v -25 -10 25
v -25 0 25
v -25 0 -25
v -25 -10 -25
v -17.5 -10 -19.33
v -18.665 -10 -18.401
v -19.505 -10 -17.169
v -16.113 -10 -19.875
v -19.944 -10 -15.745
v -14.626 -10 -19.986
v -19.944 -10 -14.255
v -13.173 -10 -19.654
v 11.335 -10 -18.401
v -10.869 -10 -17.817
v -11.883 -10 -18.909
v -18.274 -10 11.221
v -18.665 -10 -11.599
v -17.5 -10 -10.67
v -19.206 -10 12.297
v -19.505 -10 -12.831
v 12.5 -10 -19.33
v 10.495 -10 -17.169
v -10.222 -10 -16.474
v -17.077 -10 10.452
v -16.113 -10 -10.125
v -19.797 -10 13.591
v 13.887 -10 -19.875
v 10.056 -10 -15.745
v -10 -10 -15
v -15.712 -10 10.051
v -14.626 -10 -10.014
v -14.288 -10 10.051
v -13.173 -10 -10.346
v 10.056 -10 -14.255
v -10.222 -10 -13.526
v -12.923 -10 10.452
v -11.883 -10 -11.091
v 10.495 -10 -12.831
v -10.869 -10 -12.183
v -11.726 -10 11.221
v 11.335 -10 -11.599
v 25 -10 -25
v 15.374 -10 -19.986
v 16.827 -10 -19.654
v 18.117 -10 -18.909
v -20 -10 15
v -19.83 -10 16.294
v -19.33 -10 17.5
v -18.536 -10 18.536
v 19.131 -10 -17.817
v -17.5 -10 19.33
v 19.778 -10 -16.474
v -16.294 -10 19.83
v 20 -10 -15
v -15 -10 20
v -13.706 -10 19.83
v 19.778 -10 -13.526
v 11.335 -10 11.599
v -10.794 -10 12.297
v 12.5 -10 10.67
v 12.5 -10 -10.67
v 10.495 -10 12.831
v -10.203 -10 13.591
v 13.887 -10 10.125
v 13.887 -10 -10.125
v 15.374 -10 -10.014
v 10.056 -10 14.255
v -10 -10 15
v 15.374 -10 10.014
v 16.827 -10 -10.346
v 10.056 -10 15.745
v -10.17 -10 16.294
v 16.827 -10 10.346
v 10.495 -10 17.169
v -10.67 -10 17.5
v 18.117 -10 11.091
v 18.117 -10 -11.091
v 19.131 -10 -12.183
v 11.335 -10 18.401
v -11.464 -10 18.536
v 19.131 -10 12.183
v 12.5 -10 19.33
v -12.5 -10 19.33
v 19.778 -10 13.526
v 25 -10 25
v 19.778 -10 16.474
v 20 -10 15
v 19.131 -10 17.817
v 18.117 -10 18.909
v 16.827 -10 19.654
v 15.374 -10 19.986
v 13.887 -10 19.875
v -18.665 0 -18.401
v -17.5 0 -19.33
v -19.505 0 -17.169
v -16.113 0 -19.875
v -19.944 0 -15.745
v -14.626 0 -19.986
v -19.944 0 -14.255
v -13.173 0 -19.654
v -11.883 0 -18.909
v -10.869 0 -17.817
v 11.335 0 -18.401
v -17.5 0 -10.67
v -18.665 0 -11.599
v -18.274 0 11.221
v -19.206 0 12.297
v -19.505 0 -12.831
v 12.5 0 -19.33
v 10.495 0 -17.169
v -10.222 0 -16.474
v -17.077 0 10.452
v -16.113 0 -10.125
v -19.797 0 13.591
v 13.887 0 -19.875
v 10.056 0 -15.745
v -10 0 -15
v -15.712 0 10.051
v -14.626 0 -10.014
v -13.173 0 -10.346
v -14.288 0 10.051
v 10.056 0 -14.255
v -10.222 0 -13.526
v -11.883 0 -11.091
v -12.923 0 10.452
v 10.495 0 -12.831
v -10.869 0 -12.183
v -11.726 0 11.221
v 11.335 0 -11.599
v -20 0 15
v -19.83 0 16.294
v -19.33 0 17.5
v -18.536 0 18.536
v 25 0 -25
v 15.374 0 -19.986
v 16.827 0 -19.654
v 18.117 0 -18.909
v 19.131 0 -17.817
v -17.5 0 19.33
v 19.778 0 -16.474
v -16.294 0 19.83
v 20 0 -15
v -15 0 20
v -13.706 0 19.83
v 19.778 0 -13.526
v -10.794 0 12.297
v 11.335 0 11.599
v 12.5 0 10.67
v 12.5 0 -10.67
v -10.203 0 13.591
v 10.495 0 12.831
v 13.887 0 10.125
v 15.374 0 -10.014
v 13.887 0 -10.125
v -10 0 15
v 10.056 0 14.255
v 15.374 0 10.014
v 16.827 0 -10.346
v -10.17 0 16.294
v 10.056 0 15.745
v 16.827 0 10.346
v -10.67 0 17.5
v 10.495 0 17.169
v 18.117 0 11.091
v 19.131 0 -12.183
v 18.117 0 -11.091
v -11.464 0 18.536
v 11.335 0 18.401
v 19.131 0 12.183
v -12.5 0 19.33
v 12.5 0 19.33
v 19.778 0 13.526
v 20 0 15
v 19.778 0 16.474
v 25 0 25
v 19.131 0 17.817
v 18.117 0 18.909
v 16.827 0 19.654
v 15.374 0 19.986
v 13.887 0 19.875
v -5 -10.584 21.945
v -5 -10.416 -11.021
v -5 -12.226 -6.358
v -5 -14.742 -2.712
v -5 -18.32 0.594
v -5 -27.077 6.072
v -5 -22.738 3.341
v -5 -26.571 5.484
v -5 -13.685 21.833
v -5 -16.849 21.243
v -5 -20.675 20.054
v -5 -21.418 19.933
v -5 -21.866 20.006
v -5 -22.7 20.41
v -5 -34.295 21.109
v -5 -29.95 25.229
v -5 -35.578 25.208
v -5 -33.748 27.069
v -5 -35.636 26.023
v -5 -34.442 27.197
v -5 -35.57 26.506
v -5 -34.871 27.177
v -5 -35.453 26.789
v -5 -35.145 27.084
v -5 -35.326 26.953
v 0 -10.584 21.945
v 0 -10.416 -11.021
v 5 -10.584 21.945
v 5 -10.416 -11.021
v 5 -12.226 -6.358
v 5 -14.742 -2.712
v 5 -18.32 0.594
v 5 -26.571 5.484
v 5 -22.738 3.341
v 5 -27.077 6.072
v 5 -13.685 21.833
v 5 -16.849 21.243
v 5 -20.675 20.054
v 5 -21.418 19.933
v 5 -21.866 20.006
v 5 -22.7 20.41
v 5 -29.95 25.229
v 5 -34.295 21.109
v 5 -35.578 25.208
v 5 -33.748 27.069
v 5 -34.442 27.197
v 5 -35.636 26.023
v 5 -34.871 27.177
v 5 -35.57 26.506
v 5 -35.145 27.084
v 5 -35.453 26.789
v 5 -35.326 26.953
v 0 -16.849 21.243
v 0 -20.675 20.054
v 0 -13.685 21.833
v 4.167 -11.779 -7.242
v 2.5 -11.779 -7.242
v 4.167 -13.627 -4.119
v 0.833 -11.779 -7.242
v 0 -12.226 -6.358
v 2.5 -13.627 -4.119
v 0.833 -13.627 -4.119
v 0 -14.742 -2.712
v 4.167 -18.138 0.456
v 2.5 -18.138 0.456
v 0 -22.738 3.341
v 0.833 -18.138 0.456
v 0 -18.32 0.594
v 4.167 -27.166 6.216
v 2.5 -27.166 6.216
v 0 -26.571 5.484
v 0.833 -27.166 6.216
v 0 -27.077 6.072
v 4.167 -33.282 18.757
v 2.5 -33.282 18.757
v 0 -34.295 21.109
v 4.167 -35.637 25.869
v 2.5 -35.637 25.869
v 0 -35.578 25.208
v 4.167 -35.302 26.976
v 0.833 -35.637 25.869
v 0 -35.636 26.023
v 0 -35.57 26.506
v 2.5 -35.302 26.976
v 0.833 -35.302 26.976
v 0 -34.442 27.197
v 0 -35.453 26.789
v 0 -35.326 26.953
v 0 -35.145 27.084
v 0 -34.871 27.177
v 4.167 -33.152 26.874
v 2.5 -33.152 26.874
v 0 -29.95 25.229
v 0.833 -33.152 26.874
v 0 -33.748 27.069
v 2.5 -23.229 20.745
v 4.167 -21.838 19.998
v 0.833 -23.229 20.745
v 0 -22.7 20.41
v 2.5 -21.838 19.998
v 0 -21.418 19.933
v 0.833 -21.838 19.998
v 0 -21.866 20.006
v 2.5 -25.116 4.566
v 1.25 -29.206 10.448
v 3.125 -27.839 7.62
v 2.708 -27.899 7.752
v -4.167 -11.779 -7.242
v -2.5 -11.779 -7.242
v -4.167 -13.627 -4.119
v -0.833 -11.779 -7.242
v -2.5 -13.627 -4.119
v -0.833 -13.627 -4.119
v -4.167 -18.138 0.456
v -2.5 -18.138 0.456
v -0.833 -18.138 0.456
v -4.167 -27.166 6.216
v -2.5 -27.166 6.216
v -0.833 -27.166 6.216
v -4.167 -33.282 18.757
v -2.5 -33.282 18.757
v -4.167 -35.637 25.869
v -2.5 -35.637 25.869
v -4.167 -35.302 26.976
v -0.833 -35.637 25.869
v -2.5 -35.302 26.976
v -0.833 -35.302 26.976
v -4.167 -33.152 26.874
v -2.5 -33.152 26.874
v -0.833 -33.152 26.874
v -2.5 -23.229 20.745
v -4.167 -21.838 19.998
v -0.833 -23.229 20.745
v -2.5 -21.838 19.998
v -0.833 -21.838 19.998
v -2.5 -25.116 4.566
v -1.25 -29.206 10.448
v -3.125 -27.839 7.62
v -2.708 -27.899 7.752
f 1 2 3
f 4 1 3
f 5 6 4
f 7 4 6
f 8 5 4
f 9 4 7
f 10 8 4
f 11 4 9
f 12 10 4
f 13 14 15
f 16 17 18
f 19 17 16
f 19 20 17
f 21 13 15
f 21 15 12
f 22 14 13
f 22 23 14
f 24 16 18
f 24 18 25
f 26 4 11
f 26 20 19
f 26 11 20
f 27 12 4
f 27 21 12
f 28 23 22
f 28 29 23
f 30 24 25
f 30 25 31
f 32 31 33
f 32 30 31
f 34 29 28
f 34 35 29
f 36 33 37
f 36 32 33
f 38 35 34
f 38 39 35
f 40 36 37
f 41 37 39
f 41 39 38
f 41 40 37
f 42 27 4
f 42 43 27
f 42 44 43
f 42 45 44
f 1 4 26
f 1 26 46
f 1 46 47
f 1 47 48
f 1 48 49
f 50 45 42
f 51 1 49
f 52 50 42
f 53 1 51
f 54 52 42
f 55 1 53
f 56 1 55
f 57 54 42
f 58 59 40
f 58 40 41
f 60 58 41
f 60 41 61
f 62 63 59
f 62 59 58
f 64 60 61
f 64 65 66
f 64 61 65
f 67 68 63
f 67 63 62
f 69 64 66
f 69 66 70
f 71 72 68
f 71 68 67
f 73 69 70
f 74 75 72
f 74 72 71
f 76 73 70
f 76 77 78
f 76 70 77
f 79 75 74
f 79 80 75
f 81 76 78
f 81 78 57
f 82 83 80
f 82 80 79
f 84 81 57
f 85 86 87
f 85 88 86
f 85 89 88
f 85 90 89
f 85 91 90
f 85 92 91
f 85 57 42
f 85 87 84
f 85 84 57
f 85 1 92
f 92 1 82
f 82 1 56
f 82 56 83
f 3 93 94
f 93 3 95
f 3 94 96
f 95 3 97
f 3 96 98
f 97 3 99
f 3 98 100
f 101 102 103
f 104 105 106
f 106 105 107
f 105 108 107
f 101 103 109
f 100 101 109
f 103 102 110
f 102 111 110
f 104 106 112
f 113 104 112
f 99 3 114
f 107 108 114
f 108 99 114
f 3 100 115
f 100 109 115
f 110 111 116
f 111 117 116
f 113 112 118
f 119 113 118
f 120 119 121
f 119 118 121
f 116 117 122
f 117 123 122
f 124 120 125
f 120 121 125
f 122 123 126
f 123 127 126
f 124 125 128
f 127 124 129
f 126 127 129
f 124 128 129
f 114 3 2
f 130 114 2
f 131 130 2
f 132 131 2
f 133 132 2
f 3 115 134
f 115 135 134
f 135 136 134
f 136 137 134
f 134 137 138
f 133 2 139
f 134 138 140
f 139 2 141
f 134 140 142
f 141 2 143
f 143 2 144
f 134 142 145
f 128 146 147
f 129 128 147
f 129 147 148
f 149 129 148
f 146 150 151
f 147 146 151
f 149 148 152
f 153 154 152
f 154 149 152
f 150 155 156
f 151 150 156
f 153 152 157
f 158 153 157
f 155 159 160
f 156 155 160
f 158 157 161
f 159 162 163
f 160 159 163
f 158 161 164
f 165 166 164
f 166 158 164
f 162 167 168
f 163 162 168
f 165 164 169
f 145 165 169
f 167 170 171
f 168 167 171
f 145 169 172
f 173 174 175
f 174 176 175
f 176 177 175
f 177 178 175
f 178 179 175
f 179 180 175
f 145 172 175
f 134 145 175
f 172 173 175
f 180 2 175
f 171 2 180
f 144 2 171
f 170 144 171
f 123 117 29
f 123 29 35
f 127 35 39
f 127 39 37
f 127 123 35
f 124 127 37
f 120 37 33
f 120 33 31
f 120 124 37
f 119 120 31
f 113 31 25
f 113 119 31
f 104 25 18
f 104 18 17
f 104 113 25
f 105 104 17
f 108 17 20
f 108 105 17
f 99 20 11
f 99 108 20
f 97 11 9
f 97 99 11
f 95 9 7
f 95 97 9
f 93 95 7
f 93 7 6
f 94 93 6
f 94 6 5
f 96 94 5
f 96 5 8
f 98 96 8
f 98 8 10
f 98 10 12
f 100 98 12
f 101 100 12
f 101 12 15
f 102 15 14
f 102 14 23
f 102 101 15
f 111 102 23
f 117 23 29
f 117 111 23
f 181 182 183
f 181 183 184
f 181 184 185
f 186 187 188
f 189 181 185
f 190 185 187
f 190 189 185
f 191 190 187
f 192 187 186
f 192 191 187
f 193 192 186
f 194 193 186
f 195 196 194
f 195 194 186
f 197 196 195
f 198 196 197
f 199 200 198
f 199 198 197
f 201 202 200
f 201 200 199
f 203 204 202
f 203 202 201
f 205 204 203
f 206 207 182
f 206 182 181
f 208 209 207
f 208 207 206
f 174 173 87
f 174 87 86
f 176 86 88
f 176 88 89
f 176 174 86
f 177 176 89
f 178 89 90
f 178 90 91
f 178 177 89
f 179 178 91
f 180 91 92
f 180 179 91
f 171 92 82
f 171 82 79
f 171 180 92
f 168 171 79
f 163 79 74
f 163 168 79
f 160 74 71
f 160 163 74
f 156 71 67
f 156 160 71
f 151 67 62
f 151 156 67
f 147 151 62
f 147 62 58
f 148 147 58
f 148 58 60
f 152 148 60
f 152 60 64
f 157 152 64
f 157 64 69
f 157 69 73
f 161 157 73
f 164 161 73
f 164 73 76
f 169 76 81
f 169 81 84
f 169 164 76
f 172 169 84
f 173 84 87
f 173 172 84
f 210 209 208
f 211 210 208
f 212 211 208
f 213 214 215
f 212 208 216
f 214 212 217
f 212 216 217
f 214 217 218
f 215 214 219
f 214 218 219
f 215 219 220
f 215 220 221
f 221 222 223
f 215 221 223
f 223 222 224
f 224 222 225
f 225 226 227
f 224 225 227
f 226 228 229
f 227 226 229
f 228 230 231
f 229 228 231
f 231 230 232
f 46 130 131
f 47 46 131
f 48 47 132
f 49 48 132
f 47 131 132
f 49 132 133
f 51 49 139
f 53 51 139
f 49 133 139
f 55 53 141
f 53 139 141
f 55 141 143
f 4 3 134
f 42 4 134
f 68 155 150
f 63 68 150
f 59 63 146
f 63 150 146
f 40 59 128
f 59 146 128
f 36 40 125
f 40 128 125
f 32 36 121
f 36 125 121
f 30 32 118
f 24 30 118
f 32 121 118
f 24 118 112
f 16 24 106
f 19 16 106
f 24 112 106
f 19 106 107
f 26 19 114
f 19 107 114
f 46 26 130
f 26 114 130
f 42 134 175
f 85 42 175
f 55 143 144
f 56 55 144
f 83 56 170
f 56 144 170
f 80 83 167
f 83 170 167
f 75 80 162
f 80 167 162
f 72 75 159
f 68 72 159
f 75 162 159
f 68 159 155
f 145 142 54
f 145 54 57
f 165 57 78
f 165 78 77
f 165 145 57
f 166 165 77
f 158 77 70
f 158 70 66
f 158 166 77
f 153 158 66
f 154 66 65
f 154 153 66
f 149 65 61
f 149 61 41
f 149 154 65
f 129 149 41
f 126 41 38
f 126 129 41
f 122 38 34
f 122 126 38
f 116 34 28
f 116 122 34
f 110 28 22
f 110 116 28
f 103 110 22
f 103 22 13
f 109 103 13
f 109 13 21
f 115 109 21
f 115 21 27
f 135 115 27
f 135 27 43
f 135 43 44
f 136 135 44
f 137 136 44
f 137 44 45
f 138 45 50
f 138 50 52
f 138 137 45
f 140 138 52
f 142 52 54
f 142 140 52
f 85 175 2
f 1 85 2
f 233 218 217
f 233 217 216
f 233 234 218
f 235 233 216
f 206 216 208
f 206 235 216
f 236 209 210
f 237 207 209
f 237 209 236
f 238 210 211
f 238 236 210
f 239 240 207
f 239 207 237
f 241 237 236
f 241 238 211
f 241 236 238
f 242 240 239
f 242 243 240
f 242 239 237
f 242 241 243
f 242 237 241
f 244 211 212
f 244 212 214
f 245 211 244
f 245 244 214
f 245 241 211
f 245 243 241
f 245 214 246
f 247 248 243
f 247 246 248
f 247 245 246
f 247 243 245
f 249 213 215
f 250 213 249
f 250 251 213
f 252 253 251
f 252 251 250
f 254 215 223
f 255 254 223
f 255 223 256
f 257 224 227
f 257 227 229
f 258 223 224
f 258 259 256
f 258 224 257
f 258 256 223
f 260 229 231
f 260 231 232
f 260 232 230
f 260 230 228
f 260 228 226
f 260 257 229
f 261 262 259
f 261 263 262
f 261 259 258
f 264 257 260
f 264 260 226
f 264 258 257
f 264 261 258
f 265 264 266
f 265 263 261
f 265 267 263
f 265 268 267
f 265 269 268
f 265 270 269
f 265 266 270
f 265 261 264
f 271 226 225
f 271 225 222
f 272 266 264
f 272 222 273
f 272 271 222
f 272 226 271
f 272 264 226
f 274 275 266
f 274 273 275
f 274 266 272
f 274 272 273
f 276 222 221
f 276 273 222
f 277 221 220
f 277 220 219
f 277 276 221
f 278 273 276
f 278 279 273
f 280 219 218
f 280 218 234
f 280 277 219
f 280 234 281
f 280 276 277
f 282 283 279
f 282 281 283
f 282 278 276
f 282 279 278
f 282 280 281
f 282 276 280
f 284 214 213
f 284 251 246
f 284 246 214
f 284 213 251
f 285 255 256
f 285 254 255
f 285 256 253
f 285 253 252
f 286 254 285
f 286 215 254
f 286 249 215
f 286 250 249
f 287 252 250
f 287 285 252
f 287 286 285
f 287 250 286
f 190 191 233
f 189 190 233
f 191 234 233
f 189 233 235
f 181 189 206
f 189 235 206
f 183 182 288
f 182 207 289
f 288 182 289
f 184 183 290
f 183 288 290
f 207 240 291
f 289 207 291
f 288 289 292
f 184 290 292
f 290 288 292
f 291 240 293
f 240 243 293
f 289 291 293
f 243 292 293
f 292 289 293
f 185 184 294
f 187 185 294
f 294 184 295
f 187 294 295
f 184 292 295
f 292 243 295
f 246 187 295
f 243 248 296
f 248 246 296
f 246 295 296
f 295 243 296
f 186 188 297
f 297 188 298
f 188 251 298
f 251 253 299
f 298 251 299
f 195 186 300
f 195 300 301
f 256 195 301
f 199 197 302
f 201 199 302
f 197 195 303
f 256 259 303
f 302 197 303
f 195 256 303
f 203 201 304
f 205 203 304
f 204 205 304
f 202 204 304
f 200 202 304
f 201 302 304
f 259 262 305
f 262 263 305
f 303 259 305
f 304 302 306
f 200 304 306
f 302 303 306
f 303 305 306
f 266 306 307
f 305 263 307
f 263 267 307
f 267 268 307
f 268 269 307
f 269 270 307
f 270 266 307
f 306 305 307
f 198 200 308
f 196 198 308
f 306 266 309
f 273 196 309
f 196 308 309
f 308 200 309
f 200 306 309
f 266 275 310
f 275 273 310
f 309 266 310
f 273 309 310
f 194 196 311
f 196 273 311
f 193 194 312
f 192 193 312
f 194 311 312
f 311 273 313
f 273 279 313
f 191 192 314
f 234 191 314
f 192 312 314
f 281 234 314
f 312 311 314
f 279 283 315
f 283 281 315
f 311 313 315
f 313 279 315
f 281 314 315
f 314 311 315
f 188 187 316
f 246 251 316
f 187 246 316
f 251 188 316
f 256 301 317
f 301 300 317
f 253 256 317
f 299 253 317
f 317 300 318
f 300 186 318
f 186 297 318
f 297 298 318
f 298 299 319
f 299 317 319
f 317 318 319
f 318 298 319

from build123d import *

# Parameters (mm, degrees)
F0_R          = 5
F1_DEPTH      = 10
F2_R          = 3.1384776311
F3_DEPTH      = 10
F5_DEPTH      = 5
F5_DEPTH_BACK = 5


with BuildPart() as f1:
    # F0 (on Front) → F1 (new body)
    with BuildSketch(Plane.XZ):
        with BuildLine():
            Line((25, -25), (25, 25))
            Line((25, 25), (-15, 25))
            Line((-15, 25), (-15, 20))
            ThreePointArc((-15, 20), (-11.4644660941, 18.5355339059), (-10, 15))
            ThreePointArc((-10, 15), (-15, 10), (-20, 15))
            Line((-20, 15), (-25, 15))
            Line((-25, 15), (-25, -25))
            Line((-25, -25), (25, -25))
        make_face()
        with Locations((-15, -15)):
            Circle(F0_R, mode=Mode.SUBTRACT)
        with Locations((15, -15)):
            Circle(F0_R, mode=Mode.SUBTRACT)
        with Locations((15, 15)):
            Circle(F0_R, mode=Mode.SUBTRACT)
        with BuildLine():
            Line((-15, 20), (-15, 25))
            Line((-15, 25), (-25, 25))
            Line((-25, 25), (-25, 15))
            Line((-25, 15), (-20, 15))
            ThreePointArc((-20, 15), (-18.5355339059, 18.5355339059), (-15, 20))
        make_face()
    extrude(amount=F1_DEPTH)

    # F2
    f2_edges = [f1.edges().sort_by_distance(p)[0] for p in [
        (-25, -5, -25),
        (25, -5, -25),
        (25, -5, 25),
        (-25, -5, 25),
    ]]
    fillet(f2_edges, radius=F2_R)

    # F0 (on Front) → F3 (join)
    with BuildSketch(Plane.XZ):
        with BuildLine():
            Line((25, -25), (25, 25))
            Line((25, 25), (-15, 25))
            Line((-15, 25), (-15, 20))
            ThreePointArc((-15, 20), (-11.4644660941, 18.5355339059), (-10, 15))
            ThreePointArc((-10, 15), (-15, 10), (-20, 15))
            Line((-20, 15), (-25, 15))
            Line((-25, 15), (-25, -25))
            Line((-25, -25), (25, -25))
        make_face()
        with Locations((-15, -15)):
            Circle(F0_R, mode=Mode.SUBTRACT)
        with Locations((15, -15)):
            Circle(F0_R, mode=Mode.SUBTRACT)
        with Locations((15, 15)):
            Circle(F0_R, mode=Mode.SUBTRACT)
        with BuildLine():
            Line((-15, 20), (-15, 25))
            Line((-15, 25), (-25, 25))
            Line((-25, 25), (-25, 15))
            Line((-25, 15), (-20, 15))
            ThreePointArc((-20, 15), (-18.5355339059, 18.5355339059), (-15, 20))
        make_face()
    extrude(amount=F3_DEPTH)


with BuildPart() as f5:
    # F4 (on Right) → F5 (new body, two sides)
    with BuildSketch(Plane.YZ) as f5_sk:
        with BuildLine():
            add(Edge.make_bspline(
                [(-10.4162946145, -11.0212665027), (-13.2618909053, 0), (-27.131232152, 4.5833458723), (-27.2662219762, 7.4556073822), (-42.8953141264, 35.3733420403), (-22.8336770531, 20.1520311338), (-20.843864609, 19.613302644), (-15.6311493452, 22.137324768), (-10.5841569602, 21.94513008)],
                knots=[0, 0, 0, 0, 0.2397827993, 0.3419140727, 0.5683362086, 0.7554060995, 0.8365827011, 1, 1, 1, 1], degree=3))
            Line((-10.4162946145, -11.0212665027), (-10.5841569602, 21.94513008))
        make_face()
    extrude(amount=F5_DEPTH)
    extrude(f5_sk.sketch, amount=-F5_DEPTH_BACK)


solid = Compound([f1.part, f5.part])
